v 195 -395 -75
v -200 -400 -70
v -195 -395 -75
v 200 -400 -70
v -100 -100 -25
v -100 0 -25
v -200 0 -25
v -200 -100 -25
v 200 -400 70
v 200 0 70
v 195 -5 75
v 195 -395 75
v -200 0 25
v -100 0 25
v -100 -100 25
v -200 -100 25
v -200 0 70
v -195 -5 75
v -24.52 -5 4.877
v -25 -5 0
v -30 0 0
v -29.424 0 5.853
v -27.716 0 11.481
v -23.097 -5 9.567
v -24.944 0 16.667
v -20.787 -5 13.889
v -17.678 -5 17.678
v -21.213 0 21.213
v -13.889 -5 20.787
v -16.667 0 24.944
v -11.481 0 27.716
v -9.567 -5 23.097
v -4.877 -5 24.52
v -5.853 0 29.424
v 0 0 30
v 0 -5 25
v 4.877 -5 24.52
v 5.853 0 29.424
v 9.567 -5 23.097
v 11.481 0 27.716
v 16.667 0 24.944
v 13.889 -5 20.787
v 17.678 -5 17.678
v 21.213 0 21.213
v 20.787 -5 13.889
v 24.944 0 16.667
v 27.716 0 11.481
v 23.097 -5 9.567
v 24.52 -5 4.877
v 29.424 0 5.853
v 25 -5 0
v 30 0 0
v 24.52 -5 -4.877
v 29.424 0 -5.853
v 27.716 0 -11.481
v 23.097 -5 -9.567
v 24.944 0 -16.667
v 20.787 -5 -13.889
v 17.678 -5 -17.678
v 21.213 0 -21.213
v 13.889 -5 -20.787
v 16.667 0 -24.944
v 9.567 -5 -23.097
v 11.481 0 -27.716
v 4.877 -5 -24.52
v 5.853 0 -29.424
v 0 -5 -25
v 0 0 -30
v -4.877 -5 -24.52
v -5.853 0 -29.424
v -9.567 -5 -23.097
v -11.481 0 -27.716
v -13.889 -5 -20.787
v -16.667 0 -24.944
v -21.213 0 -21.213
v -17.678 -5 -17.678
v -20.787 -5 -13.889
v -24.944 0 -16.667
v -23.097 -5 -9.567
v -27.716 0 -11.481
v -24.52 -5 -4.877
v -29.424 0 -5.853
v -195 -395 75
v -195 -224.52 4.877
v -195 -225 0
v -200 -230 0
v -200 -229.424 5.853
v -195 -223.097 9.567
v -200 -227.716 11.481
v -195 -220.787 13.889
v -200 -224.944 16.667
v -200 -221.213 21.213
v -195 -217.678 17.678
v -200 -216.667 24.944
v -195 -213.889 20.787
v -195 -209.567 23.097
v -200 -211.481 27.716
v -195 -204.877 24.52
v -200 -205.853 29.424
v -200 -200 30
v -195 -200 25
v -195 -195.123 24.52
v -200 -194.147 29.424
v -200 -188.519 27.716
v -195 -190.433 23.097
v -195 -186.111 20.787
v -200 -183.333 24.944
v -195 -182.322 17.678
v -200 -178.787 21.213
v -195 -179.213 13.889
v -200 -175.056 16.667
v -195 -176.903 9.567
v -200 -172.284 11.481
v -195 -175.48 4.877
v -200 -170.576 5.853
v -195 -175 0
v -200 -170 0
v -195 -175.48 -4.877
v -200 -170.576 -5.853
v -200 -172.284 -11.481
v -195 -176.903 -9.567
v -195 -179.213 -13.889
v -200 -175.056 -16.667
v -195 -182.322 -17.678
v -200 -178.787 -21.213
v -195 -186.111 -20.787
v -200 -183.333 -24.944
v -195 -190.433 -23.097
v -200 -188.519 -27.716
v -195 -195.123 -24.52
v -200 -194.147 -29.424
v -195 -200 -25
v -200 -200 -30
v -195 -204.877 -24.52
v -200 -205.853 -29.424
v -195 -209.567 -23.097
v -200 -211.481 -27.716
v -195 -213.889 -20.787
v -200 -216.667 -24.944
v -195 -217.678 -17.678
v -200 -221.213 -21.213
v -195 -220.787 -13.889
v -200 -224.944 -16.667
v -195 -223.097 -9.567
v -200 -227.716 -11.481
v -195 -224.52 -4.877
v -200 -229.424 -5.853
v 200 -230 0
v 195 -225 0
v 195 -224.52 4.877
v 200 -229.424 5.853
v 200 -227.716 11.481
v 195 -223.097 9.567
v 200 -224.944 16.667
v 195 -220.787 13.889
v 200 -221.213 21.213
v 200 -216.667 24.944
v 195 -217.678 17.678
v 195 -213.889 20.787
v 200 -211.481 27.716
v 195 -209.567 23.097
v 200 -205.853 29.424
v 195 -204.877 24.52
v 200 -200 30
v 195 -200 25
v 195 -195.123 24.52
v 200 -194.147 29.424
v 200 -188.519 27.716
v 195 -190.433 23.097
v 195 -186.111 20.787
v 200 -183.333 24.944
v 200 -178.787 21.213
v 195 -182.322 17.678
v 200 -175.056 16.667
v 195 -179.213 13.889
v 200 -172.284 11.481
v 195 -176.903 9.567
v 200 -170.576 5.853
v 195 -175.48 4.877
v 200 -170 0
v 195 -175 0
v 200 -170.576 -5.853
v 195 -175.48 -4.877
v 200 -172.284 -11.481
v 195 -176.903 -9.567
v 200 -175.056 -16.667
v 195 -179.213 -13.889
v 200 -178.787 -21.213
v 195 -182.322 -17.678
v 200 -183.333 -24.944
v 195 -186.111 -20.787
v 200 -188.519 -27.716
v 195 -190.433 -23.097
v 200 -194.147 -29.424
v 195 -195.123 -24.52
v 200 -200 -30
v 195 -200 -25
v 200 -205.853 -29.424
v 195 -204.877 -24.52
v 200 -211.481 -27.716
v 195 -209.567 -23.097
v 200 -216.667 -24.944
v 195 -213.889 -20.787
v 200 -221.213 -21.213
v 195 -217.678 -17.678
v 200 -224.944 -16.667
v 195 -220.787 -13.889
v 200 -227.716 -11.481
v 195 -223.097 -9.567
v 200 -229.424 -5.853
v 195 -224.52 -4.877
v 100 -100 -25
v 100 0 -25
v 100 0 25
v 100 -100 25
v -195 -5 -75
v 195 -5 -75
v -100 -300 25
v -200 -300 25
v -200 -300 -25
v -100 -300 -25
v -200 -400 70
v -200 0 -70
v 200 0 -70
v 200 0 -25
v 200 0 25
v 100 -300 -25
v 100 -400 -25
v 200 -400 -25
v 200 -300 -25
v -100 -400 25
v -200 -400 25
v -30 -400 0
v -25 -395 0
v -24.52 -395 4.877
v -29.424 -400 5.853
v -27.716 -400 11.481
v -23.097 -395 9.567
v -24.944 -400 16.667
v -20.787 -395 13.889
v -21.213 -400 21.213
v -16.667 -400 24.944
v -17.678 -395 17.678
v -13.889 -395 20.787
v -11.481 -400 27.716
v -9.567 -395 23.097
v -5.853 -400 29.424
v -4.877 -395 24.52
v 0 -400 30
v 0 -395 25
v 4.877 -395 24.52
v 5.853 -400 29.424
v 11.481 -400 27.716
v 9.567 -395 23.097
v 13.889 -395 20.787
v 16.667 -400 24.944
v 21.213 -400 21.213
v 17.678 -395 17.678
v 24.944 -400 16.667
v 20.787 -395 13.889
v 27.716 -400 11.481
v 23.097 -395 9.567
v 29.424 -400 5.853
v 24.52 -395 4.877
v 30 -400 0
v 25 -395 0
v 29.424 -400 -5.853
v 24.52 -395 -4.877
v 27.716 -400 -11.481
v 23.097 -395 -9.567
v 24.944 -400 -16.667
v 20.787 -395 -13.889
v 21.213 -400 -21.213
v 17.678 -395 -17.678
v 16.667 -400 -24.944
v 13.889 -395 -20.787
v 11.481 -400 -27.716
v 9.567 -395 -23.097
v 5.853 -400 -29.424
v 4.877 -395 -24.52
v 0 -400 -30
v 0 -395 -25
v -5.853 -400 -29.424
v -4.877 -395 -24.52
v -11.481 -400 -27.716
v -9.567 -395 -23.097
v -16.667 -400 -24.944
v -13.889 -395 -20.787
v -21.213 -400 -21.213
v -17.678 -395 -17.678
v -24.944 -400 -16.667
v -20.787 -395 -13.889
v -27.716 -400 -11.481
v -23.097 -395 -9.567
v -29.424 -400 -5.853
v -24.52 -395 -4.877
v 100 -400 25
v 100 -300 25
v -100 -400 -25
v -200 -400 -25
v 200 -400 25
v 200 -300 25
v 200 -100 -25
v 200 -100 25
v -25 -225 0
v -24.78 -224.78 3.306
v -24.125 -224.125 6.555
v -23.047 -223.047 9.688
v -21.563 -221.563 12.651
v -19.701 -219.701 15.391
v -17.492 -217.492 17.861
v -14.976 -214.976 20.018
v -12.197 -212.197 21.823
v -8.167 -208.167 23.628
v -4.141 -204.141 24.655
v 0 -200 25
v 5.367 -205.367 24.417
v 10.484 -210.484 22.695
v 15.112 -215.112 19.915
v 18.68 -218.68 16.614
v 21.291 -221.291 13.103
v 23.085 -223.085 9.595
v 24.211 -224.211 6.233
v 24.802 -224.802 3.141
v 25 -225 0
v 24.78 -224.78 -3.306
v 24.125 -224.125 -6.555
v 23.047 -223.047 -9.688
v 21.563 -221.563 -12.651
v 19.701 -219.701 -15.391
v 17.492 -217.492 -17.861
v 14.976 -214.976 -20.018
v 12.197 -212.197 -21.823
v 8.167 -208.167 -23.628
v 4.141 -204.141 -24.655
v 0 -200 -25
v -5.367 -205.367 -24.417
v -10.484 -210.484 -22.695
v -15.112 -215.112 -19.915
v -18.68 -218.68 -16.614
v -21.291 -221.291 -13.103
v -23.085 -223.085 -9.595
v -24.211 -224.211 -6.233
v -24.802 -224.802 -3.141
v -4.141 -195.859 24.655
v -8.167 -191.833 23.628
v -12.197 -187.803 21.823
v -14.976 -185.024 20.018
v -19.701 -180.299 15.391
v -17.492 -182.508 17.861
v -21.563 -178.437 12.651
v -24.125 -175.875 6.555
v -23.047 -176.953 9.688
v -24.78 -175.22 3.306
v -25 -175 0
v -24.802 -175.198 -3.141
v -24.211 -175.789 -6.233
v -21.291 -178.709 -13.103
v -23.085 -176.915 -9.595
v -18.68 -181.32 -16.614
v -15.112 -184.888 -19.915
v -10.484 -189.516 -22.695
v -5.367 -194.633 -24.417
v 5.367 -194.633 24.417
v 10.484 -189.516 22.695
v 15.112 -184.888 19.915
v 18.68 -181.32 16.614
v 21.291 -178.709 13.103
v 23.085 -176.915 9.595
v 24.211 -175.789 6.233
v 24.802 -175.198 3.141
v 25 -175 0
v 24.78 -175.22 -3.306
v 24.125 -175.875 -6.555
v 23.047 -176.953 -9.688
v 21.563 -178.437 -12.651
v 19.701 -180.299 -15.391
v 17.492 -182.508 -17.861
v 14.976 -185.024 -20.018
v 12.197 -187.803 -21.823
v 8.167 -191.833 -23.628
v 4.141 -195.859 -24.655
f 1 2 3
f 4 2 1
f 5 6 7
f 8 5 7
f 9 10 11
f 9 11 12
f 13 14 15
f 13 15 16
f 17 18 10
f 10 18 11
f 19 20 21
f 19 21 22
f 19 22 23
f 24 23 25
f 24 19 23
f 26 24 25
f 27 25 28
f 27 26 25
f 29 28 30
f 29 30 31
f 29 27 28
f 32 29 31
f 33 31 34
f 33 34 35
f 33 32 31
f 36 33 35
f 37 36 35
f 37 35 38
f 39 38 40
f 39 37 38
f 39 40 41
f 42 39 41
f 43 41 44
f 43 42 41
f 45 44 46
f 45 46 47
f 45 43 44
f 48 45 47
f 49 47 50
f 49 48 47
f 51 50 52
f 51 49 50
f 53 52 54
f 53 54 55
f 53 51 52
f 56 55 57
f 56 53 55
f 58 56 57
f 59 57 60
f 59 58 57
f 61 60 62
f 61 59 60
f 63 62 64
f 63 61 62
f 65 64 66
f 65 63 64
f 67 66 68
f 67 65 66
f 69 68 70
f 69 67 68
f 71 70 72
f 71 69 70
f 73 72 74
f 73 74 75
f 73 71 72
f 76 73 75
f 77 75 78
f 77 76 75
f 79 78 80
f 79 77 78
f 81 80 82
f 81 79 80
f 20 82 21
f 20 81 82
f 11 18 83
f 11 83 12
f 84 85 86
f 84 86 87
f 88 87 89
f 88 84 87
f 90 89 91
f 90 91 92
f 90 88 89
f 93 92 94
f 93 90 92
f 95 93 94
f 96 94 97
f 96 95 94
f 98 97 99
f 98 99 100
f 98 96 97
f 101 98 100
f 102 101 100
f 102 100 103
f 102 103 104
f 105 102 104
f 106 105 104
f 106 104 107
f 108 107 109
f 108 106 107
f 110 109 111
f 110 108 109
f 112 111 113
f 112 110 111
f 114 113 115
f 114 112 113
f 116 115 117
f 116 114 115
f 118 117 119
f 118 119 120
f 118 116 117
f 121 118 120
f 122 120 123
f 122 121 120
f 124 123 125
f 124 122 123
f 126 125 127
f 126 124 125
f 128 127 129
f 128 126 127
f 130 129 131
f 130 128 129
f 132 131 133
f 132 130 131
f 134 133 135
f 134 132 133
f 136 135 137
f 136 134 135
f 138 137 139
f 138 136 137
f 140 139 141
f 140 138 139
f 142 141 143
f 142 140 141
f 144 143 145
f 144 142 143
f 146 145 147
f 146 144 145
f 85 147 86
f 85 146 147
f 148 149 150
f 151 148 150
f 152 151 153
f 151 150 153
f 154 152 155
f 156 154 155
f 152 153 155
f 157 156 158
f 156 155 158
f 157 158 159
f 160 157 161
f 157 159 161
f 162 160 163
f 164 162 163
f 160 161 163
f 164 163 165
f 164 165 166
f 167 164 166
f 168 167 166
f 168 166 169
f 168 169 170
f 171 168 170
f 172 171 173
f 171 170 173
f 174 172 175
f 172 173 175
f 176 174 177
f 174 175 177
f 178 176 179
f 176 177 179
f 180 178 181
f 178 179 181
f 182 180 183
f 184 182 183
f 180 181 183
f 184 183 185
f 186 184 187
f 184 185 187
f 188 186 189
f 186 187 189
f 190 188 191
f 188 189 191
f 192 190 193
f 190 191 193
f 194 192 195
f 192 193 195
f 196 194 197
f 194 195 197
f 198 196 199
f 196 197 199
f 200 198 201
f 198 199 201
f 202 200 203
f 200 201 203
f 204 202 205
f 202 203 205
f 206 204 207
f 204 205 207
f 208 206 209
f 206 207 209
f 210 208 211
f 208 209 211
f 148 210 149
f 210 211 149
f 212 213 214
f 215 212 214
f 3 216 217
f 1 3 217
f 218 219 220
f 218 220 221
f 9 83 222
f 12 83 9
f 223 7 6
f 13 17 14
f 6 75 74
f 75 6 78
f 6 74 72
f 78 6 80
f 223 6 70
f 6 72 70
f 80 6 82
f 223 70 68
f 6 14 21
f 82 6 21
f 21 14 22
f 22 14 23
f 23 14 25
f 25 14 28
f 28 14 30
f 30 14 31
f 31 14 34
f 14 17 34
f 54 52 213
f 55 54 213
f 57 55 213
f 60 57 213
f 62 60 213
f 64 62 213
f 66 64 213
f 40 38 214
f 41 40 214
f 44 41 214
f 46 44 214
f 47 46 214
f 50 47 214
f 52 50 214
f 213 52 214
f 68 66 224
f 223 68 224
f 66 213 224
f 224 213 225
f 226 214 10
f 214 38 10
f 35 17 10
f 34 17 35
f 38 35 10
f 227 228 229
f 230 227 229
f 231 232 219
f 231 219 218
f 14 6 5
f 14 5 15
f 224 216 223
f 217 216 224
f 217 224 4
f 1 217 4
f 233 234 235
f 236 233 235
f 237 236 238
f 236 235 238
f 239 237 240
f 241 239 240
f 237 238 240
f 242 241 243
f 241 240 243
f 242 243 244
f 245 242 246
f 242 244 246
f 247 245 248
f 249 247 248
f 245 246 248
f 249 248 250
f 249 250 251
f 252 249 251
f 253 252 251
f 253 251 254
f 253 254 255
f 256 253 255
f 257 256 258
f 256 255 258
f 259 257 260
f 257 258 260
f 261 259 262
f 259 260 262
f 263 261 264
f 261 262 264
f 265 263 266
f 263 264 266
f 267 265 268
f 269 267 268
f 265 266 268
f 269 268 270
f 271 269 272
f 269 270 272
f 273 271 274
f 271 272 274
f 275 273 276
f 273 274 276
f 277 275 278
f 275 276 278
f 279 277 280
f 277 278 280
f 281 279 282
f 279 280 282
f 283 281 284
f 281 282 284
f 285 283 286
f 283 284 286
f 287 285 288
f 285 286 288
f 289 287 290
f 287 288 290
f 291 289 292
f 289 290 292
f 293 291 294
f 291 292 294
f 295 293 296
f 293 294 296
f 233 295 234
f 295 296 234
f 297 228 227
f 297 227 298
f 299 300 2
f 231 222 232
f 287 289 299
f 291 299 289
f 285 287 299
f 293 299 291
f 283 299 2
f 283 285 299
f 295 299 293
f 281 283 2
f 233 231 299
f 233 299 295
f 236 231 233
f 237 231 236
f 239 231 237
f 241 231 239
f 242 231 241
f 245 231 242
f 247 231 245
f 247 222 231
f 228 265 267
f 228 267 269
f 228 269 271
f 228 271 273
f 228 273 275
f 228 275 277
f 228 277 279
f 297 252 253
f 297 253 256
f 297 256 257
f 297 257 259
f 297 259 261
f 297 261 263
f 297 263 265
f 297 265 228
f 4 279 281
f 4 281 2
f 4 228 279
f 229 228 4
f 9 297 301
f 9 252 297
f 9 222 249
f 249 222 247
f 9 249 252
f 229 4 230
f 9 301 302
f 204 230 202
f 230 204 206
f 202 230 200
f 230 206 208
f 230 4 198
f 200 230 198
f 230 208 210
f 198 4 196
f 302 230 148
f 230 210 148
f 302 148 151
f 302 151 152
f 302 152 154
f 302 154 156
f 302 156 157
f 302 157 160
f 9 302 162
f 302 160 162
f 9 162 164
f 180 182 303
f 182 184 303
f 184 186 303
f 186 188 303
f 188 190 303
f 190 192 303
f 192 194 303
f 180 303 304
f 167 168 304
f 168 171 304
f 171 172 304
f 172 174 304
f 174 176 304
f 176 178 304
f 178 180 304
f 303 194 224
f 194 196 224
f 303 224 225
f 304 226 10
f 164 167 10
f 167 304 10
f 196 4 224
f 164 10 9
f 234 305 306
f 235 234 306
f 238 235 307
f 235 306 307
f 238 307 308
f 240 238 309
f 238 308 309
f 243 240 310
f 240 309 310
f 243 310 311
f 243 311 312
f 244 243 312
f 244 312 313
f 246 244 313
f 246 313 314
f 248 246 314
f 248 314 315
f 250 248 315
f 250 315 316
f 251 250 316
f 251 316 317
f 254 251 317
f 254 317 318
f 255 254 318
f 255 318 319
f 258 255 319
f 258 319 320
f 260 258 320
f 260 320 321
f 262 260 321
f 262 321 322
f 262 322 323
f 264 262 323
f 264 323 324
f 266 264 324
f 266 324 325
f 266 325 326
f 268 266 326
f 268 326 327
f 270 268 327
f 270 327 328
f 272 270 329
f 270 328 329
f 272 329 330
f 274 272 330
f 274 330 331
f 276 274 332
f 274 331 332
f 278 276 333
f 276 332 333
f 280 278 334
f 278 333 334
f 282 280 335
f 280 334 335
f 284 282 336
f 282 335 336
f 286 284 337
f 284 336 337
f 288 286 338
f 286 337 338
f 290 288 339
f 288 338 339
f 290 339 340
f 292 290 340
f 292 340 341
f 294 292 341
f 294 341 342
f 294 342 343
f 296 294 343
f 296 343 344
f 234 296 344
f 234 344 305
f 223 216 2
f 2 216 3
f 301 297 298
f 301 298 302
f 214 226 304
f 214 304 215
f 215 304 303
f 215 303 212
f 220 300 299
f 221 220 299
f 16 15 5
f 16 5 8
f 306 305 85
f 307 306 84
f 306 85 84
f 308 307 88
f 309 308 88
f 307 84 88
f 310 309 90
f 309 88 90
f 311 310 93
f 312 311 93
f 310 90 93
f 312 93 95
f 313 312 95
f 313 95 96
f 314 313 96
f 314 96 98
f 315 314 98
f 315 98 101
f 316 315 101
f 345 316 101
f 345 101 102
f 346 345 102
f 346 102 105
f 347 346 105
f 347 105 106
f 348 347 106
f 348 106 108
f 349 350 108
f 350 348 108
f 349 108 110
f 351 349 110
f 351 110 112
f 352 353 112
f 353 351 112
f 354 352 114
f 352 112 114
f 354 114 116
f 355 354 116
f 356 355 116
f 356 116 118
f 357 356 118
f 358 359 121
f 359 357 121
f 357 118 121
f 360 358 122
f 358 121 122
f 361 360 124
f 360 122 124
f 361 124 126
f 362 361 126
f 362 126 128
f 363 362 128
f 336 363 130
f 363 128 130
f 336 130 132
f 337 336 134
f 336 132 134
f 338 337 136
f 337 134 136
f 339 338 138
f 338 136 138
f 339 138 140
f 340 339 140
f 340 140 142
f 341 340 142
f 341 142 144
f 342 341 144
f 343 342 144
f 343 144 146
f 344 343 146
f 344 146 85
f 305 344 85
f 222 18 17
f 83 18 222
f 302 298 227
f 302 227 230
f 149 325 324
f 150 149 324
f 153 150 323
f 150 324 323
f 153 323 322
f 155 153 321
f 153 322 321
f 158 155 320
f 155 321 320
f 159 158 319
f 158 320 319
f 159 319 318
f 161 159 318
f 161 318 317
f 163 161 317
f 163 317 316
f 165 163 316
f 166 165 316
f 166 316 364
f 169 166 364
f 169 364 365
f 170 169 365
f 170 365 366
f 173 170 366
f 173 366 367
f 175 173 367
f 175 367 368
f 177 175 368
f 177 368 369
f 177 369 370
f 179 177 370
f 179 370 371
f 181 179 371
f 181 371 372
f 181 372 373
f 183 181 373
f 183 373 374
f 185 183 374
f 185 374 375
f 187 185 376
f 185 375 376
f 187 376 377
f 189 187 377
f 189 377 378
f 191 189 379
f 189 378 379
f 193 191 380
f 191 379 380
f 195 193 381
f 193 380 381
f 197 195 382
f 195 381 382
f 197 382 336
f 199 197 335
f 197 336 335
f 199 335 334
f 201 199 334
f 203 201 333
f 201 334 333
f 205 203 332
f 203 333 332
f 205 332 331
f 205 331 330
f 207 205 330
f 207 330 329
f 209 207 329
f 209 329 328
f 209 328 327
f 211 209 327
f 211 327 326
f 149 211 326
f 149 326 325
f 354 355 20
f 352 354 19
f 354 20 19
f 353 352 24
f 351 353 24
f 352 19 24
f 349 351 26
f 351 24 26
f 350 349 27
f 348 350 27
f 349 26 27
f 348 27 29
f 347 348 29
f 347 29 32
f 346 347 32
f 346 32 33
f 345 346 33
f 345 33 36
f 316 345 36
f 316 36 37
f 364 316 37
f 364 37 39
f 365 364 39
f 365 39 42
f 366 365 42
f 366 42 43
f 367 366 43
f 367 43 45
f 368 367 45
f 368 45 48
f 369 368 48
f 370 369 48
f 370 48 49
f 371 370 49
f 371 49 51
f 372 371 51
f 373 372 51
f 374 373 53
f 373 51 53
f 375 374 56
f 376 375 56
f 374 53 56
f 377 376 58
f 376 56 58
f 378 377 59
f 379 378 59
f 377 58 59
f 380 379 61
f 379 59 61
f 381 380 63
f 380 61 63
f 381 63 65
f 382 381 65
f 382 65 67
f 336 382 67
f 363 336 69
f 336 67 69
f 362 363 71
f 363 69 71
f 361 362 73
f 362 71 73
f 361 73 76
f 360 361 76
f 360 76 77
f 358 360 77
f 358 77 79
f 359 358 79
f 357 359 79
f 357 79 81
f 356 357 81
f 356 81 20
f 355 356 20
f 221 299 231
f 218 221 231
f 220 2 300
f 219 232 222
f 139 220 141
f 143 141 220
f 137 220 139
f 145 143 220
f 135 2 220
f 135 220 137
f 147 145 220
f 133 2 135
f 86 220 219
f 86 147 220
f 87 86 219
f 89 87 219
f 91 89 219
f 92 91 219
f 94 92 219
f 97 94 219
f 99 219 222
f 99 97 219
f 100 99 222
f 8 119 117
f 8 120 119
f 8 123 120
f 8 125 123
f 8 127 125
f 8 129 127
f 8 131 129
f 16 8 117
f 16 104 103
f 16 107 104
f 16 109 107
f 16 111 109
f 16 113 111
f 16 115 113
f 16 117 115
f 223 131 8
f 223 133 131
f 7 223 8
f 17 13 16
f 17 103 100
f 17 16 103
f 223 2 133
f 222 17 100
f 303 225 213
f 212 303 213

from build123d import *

# Parameters (mm, degrees)
F0_W     = 400
F0_H     = 150
F1_DEPTH = 400
F2_W     = 100
F2_H     = 50
F3_DEPTH = 100
F4_W     = 100
F4_H     = 50
F5_DEPTH = 100
F6_R     = 25
F7_DEPTH = 400.001
F8_R     = 25
F9_DEPTH = 400.001
F10_SIZE = 5


with BuildPart() as f1:
    # F0 (on Front) → F1 (new body)
    with BuildSketch(Plane.XZ):
        Rectangle(F0_W, F0_H)
    extrude(amount=F1_DEPTH)

    # F2 (on face) → F3 (cut)
    with BuildSketch(Plane.XZ.offset(400)):
        with Locations((150, 0)):
            Rectangle(F2_W, F2_H)
        with Locations((-150, 0)):
            Rectangle(F2_W, F2_H)
    extrude(amount=-F3_DEPTH, mode=Mode.SUBTRACT)

    # F4 (on face) → F5 (cut)
    with BuildSketch(Plane(origin=(0, 0, 0), x_dir=(-1, 0, 0), z_dir=(0, 1, 0))):
        with Locations((150, 0)):
            Rectangle(F4_W, F4_H)
        with Locations((-150, 0)):
            Rectangle(F4_W, F4_H)
    extrude(amount=-F5_DEPTH, mode=Mode.SUBTRACT)

    # F6 (on face) → F7 (cut, through all)
    with BuildSketch(Plane(origin=(0, 0, 0), x_dir=(-1, 0, 0), z_dir=(0, 1, 0))):
        Circle(F6_R)
    extrude(amount=-F7_DEPTH, mode=Mode.SUBTRACT)

    # F8 (on face) → F9 (cut, through all)
    with BuildSketch(Plane(origin=(-200, 0, 0), x_dir=(0, -1, 0), z_dir=(-1, 0, 0))):
        with Locations((200, 0)):
            Circle(F8_R)
    extrude(amount=-F9_DEPTH, mode=Mode.SUBTRACT)

    # F10
    f10_edges = [f1.edges().sort_by_distance(p)[0] for p in [
        (-200, -200, 75),
        (-200, -200, -75),
        (0, 0, 75),
        (0, 0, -75),
        (-200, -175, 0),
        (25, 0, 0),
        (200, -200, -75),
        (200, -200, 75),
        (200, -175, 0),
        (0, -400, -75),
        (0, -400, 75),
        (25, -400, 0),
    ]]
    chamfer(f10_edges, length=F10_SIZE)


solid = f1.part
